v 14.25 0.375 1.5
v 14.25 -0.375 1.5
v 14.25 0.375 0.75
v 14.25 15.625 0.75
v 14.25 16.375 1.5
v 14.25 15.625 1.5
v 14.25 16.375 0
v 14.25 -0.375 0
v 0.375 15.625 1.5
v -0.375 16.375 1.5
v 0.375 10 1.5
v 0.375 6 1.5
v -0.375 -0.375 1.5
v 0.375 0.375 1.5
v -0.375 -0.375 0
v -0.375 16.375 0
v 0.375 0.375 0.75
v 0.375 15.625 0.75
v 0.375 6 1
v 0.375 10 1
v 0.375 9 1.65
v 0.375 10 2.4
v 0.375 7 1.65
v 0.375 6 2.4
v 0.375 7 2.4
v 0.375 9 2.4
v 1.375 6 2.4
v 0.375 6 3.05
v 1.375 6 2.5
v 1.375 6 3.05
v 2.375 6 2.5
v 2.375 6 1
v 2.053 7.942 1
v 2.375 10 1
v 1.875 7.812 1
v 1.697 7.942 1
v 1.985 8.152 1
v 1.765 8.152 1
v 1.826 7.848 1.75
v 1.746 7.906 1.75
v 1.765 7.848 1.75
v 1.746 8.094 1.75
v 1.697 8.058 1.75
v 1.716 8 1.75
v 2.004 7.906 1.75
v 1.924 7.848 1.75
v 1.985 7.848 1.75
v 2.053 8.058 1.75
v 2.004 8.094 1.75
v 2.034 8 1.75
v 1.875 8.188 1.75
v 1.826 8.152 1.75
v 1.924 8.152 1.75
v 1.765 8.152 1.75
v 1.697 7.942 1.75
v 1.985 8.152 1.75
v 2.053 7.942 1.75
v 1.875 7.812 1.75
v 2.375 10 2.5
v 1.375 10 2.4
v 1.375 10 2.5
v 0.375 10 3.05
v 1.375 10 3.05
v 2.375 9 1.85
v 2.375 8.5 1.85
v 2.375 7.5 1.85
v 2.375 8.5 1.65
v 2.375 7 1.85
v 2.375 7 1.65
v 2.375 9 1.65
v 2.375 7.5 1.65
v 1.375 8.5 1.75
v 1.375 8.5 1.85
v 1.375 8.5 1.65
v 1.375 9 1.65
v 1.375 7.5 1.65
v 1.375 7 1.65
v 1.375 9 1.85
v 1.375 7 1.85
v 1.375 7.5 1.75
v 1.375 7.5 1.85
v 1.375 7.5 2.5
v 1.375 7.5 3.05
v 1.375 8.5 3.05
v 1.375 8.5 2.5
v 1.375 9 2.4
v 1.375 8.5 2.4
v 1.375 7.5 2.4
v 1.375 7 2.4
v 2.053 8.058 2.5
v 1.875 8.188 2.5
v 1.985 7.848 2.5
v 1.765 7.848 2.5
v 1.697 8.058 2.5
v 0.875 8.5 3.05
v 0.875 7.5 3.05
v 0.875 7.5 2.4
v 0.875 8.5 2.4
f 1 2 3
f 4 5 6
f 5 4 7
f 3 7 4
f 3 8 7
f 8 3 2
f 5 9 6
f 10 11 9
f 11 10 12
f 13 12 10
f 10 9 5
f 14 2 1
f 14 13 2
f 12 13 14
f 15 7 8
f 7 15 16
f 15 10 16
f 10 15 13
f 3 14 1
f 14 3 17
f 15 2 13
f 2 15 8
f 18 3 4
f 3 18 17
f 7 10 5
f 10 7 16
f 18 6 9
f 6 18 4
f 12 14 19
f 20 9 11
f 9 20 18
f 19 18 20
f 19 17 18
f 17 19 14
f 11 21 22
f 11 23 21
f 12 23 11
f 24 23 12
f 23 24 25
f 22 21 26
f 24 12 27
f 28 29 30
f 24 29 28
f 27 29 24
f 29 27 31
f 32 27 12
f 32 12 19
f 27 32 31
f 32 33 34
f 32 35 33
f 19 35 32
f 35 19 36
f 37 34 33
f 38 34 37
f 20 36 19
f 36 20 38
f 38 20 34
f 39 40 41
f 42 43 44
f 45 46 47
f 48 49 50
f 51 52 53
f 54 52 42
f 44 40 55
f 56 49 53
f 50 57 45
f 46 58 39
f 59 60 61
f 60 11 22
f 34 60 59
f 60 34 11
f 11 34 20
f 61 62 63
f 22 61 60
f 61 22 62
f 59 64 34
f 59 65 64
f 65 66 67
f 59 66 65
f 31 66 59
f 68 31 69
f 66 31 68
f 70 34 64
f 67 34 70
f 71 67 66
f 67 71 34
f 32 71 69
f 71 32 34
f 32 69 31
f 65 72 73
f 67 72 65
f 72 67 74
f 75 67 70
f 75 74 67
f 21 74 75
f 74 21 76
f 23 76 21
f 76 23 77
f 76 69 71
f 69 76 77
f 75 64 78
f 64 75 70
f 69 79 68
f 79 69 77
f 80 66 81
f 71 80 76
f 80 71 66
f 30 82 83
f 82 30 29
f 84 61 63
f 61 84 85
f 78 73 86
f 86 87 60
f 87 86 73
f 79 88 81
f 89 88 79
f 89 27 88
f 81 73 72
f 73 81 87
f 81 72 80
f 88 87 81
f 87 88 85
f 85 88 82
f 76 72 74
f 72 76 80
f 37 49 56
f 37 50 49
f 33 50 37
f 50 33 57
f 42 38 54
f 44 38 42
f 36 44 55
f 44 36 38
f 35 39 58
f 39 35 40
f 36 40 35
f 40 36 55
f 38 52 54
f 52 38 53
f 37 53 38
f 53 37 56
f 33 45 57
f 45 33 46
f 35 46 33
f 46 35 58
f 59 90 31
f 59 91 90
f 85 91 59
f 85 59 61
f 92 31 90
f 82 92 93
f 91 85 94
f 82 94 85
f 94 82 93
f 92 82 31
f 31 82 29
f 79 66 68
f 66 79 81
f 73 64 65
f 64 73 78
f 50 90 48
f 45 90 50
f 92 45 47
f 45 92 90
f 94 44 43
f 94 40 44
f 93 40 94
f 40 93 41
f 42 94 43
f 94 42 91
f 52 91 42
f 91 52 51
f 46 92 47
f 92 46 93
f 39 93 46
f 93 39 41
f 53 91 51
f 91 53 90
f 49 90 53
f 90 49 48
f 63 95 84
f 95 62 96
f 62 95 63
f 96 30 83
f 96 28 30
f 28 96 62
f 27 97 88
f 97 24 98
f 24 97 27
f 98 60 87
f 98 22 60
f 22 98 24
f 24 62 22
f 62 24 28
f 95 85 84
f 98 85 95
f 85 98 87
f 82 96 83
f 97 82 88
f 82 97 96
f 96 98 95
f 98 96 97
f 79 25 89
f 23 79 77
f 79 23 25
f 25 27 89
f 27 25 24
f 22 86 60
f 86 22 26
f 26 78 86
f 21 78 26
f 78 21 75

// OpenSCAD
// file: objects/ExtraHandsClamp.scad
module ExtraHandsClamp(lapDepth, obThickness, bExploded,bCutView){
clampLen=4;
clampWidth=2;
clampFrontL=clampLen;
clampFrontW =clampWidth/2;
clampBackW =clampWidth/2;
footNotch =0.5;
footBack = 1;
backNotchL=1;
backNotchW = 0.5;
backNotchD =0.375;

//Base
rotate([180,0,180])
translate([-clampLen,0,0])
difference(){
cube([clampLen,clampWidth,obThickness]);
translate([1,0,0])    cube([footNotch,clampWidth,lapDepth]);
// right Foot    
translate([2.5,0,0])    cube([footNotch,clampWidth,lapDepth]);
// Left Foot

 translate([0,1,0]) cube([clampLen,footBack,lapDepth]);
if (!bCutView) {
    translate([clampLen/2,clampFrontW/2,0]) cylinder(r=0.1875);}
// Rear foot
     
} 

// Front clamp
rotate(bCutView ? [180,0,0] : [0,0,0])
// echo(bExploded ? [0,-1,0] : bCutView ? [4,-1,0] : [0,0,0]);
translate(bExploded ? [0,-1,0] : bCutView ? [4,-1,0] : [0,0,0])
difference(){
    cube([clampFrontL,clampFrontW,obThickness]);
    translate([1,0,0])    cube([footNotch,clampFrontW,lapDepth]);
    
translate([2.5,0,0])    cube([footNotch,clampFrontW,lapDepth]);
    if(!bCutView) translate([clampFrontL/2,clampFrontW/2,0]) cylinder(r=0.1875);
  }

// Back clamp
rotate(bCutView ? [180,0,0] : [0,0,0])  
translate(bExploded ? [0,2,1.5] : bCutView ? [4,-2,lapDepth] : [0,1,obThickness-lapDepth]) 
difference(){
    cube([clampLen,clampBackW,obThickness-lapDepth]);
    translate([1.5,0,0]) cube([backNotchL,backNotchW,obThickness-lapDepth]);    
}

translate(bExploded ? [0,1.25,.5] : bCutView ? [8,0,-obThickness] : [0,clampFrontW,-lapDepth]) 
cube([1,1,obThickness]);

translate(bExploded ? [3,1.25,.5] : bCutView ? [9,0,-obThickness] : [3,clampFrontW,-lapDepth]) 
cube([1,1,obThickness]);
}
// file: objects/base.scad
module SolderingSta(lapDepth, obThickness, bExploded){

// Dimesnions of the inside base
baseWidth=16;
baseLen=14.25;
sideHeight=1.5;
//add Len for Lap
sideLen=baseLen+lapDepth;

//Base

cube([baseLen,baseWidth,obThickness]);

//Right Side
translate(bExploded?[-0.5, -3, 0]:[-lapDepth, -lapDepth, 0])
difference(){
    cube([sideLen,obThickness, sideHeight]);
    translate([0,lapDepth,0]) cube([sideLen,lapDepth, obThickness]); // Bottom lap
    translate([0,lapDepth,0]) cube([lapDepth, lapDepth, 1.75]); // Corner lap
}

//Left Side
translate(bExploded?[-0.5, 18, 0]:[-lapDepth,baseWidth-lapDepth,0])
difference(){
    cube([sideLen,obThickness, sideHeight]);
    cube([sideLen,lapDepth, obThickness]); // Bottom lap
    cube([lapDepth, lapDepth, sideLen]); // Corner lap
}

//Front
frontWidth = baseWidth+obThickness;
translate(bExploded?[-2,-0.50,0]:[-lapDepth,-lapDepth,0])
difference(){
cube([obThickness,frontWidth, sideHeight]);
translate([lapDepth,0,0]) cube([lapDepth,frontWidth, obThickness]);    // Bottom lap
translate([lapDepth,0,0])cube([lapDepth,lapDepth,sideHeight]);    // Right corner lap
translate([lapDepth,frontWidth-lapDepth,0])cube([lapDepth,lapDepth,sideHeight]); // Left corner lap
}
}
// main file
//Thickness of the 1X8's 3/4" for the milling
obThickness=0.75;
// Lap depth
lapDepth=0.375;



bExploded = false;
bCutView = false;

use <objects/base.scad>
use <objects/ExtraHandsClamp.scad>

SolderingSta(lapDepth, obThickness, bExploded);

rotate([0,0,90]) translate([6,-2.375,1+obThickness])  ExtraHandsClamp(0.1, obThickness, false, bCutView);
